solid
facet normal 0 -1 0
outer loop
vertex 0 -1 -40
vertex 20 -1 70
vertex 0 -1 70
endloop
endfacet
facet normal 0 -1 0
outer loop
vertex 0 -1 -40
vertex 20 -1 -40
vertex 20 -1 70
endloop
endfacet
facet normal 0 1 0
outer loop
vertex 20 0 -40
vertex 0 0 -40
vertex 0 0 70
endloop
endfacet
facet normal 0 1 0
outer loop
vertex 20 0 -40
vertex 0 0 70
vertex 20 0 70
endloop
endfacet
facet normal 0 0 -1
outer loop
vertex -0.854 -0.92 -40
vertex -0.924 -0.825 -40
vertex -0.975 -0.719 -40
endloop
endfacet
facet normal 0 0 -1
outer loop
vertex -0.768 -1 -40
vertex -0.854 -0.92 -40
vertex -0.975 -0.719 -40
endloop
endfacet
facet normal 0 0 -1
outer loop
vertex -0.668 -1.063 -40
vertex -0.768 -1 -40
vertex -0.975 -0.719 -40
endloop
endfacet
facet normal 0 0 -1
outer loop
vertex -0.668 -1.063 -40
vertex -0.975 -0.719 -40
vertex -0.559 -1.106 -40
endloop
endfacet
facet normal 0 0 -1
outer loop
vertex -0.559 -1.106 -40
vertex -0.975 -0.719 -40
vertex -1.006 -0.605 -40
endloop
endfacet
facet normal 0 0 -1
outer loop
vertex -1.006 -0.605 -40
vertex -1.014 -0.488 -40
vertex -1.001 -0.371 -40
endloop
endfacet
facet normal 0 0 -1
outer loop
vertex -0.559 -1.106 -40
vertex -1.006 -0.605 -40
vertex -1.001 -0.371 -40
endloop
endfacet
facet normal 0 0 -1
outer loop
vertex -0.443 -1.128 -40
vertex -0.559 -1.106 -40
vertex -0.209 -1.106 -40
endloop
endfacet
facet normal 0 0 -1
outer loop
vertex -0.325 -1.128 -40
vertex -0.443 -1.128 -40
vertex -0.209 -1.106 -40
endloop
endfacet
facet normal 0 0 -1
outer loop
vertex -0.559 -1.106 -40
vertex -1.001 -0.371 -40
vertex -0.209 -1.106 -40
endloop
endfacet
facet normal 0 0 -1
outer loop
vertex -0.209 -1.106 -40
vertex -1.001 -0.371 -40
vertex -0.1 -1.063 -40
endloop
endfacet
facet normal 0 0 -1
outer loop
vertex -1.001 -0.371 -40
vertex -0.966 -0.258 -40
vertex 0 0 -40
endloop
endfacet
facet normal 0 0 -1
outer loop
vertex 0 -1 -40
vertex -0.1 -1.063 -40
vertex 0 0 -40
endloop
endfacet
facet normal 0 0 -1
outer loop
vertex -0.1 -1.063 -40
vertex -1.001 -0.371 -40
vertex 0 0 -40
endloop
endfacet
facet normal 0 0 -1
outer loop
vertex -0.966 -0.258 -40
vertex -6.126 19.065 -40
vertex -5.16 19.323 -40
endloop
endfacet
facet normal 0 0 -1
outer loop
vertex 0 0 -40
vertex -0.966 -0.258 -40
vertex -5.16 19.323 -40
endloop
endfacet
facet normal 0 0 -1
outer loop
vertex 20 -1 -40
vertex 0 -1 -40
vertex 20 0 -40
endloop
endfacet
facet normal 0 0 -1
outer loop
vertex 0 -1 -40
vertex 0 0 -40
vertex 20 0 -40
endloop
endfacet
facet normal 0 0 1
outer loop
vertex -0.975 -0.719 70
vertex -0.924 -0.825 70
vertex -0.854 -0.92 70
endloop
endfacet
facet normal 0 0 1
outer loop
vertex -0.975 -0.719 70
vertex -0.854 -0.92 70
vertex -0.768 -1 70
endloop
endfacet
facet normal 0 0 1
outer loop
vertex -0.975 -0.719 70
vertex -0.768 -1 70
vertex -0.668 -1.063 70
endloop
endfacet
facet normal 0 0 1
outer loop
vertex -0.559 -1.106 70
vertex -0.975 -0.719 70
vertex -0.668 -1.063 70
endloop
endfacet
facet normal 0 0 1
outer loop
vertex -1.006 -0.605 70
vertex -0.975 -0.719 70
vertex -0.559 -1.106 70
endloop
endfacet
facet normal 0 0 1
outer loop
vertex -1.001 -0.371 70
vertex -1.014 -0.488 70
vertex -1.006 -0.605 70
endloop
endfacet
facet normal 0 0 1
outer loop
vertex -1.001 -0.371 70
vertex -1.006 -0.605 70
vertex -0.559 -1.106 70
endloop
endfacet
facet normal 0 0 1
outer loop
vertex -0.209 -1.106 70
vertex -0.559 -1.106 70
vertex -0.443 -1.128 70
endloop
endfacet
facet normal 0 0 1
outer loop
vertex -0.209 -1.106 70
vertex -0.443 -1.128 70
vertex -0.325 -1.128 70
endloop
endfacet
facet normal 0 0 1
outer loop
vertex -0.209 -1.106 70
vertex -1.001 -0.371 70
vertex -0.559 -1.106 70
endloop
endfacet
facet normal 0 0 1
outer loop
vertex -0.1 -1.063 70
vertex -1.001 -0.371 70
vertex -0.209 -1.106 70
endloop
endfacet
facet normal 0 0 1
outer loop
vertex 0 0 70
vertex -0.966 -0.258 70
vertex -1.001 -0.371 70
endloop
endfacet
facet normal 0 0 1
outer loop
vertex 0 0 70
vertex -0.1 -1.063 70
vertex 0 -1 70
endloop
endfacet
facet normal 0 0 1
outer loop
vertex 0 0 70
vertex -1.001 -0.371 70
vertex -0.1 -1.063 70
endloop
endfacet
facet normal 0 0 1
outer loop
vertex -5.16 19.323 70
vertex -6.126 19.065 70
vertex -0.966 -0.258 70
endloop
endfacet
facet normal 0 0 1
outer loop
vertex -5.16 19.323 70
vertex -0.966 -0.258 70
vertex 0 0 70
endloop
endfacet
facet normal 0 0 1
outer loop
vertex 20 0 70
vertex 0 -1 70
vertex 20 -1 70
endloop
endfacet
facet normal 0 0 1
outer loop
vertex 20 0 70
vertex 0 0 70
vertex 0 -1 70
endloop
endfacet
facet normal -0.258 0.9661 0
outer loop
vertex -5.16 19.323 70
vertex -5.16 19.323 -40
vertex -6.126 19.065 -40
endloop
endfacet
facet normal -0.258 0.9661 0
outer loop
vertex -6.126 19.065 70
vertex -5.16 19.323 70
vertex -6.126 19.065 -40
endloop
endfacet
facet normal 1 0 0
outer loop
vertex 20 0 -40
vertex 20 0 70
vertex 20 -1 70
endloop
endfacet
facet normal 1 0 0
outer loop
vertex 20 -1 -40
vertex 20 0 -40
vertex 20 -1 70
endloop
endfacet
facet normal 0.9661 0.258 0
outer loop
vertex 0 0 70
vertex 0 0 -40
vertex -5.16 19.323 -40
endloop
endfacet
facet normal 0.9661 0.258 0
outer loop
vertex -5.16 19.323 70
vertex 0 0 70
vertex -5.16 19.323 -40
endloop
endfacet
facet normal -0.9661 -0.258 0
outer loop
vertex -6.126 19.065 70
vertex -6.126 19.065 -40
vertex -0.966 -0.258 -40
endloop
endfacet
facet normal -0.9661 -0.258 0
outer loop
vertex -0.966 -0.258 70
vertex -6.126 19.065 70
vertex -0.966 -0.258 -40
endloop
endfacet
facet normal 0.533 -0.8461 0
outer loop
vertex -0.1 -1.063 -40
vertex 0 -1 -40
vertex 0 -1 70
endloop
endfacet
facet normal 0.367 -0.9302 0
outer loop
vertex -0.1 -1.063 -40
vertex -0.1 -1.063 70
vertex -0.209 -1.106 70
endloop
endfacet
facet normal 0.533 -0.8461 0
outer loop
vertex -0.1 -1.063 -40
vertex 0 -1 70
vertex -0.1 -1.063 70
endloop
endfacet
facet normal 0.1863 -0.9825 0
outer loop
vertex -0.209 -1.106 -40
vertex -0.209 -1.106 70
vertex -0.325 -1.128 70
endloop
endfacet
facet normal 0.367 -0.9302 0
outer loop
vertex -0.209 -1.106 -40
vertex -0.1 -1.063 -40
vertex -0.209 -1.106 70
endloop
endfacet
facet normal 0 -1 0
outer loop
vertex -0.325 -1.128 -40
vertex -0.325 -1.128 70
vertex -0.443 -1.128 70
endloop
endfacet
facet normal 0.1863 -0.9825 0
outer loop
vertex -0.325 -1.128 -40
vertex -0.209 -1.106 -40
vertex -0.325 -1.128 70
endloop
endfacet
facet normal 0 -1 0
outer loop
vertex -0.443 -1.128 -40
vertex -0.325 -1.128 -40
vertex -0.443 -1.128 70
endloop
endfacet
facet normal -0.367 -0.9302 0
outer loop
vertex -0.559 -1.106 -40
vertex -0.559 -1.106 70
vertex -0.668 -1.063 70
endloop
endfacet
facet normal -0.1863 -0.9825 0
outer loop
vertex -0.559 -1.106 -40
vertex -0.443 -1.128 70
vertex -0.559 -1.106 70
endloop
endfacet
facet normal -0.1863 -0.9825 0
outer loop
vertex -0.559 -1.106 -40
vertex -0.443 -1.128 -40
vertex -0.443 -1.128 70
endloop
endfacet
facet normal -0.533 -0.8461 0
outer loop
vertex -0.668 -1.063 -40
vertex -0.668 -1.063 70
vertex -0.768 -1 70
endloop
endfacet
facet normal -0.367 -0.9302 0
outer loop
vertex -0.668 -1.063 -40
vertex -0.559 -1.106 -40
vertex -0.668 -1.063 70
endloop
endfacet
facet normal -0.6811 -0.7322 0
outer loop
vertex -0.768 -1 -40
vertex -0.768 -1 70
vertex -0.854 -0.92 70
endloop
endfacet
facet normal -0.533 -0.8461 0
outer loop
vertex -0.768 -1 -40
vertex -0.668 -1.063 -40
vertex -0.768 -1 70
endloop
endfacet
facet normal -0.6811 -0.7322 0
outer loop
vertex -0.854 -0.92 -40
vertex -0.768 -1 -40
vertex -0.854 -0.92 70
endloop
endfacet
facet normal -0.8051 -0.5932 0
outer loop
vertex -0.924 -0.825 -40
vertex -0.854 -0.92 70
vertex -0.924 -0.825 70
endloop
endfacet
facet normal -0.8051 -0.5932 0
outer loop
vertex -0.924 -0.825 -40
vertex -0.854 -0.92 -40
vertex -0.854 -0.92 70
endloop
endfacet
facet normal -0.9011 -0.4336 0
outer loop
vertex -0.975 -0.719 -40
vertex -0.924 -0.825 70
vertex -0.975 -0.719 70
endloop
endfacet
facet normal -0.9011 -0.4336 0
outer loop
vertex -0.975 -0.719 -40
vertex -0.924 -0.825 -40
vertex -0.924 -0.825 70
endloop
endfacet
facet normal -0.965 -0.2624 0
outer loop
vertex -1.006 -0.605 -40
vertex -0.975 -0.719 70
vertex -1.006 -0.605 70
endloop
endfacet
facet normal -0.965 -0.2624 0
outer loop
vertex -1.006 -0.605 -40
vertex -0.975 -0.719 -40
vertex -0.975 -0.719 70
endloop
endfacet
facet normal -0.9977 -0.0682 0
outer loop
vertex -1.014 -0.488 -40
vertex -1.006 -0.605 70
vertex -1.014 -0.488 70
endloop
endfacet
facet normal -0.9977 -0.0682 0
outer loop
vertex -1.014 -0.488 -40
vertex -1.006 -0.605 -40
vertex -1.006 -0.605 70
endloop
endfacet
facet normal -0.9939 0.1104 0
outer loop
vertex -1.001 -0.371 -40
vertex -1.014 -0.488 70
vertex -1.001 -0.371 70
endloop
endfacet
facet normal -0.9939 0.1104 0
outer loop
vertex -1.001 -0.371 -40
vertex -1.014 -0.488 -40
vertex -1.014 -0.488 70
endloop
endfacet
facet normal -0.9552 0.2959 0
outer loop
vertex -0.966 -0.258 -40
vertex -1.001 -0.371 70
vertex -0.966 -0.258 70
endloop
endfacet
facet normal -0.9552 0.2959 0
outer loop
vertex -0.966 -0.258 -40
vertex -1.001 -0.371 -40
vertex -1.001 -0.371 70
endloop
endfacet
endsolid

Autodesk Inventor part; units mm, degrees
ref_plane "YZ Plane" through (0, 0, 0) normal (1, 0, 0) x (0, 1, 0)
ref_plane "XZ Plane" through (0, 0, 0) normal (0, 1, 0) x (-1, 0, 0)
ref_plane "XY Plane" through (0, 0, 0) normal (0, 0, 1) x (1, 0, 0)
sketch "Sketch1" plane through (0, 0, 0) normal (0, 0, 1) x (1, 0, 0)
  line L0 (0, 0) -> (20, 0)
  line L1 (20, 0) -> (20, -1)
  line L2 (20, -1) -> (0, -1)
  line L3 (0, -1) -> (0, 0)
  line L4 (0, 0) -> (-5.1595, 19.323)
  line L5 (-5.1595, 19.323) -> (-6.1257, 19.0651)
  line L6 (-6.1257, 19.0651) -> (-0.9662, -0.258)
  line L7 (-0.9662, -0.258) -> (0, 0)
  circle A0 centre (-0.384, -0.5) radius 0.6304
  dimension "d0" = 20
  dimension "d1" = 1
  dimension "d2" = 104.95
extrude "Extrusion1" add sketch "Sketch1" along normal blind 70 and the other way blind 40
properties part number "scharnierband" material "Brass, Soft Yellow, Welded"
